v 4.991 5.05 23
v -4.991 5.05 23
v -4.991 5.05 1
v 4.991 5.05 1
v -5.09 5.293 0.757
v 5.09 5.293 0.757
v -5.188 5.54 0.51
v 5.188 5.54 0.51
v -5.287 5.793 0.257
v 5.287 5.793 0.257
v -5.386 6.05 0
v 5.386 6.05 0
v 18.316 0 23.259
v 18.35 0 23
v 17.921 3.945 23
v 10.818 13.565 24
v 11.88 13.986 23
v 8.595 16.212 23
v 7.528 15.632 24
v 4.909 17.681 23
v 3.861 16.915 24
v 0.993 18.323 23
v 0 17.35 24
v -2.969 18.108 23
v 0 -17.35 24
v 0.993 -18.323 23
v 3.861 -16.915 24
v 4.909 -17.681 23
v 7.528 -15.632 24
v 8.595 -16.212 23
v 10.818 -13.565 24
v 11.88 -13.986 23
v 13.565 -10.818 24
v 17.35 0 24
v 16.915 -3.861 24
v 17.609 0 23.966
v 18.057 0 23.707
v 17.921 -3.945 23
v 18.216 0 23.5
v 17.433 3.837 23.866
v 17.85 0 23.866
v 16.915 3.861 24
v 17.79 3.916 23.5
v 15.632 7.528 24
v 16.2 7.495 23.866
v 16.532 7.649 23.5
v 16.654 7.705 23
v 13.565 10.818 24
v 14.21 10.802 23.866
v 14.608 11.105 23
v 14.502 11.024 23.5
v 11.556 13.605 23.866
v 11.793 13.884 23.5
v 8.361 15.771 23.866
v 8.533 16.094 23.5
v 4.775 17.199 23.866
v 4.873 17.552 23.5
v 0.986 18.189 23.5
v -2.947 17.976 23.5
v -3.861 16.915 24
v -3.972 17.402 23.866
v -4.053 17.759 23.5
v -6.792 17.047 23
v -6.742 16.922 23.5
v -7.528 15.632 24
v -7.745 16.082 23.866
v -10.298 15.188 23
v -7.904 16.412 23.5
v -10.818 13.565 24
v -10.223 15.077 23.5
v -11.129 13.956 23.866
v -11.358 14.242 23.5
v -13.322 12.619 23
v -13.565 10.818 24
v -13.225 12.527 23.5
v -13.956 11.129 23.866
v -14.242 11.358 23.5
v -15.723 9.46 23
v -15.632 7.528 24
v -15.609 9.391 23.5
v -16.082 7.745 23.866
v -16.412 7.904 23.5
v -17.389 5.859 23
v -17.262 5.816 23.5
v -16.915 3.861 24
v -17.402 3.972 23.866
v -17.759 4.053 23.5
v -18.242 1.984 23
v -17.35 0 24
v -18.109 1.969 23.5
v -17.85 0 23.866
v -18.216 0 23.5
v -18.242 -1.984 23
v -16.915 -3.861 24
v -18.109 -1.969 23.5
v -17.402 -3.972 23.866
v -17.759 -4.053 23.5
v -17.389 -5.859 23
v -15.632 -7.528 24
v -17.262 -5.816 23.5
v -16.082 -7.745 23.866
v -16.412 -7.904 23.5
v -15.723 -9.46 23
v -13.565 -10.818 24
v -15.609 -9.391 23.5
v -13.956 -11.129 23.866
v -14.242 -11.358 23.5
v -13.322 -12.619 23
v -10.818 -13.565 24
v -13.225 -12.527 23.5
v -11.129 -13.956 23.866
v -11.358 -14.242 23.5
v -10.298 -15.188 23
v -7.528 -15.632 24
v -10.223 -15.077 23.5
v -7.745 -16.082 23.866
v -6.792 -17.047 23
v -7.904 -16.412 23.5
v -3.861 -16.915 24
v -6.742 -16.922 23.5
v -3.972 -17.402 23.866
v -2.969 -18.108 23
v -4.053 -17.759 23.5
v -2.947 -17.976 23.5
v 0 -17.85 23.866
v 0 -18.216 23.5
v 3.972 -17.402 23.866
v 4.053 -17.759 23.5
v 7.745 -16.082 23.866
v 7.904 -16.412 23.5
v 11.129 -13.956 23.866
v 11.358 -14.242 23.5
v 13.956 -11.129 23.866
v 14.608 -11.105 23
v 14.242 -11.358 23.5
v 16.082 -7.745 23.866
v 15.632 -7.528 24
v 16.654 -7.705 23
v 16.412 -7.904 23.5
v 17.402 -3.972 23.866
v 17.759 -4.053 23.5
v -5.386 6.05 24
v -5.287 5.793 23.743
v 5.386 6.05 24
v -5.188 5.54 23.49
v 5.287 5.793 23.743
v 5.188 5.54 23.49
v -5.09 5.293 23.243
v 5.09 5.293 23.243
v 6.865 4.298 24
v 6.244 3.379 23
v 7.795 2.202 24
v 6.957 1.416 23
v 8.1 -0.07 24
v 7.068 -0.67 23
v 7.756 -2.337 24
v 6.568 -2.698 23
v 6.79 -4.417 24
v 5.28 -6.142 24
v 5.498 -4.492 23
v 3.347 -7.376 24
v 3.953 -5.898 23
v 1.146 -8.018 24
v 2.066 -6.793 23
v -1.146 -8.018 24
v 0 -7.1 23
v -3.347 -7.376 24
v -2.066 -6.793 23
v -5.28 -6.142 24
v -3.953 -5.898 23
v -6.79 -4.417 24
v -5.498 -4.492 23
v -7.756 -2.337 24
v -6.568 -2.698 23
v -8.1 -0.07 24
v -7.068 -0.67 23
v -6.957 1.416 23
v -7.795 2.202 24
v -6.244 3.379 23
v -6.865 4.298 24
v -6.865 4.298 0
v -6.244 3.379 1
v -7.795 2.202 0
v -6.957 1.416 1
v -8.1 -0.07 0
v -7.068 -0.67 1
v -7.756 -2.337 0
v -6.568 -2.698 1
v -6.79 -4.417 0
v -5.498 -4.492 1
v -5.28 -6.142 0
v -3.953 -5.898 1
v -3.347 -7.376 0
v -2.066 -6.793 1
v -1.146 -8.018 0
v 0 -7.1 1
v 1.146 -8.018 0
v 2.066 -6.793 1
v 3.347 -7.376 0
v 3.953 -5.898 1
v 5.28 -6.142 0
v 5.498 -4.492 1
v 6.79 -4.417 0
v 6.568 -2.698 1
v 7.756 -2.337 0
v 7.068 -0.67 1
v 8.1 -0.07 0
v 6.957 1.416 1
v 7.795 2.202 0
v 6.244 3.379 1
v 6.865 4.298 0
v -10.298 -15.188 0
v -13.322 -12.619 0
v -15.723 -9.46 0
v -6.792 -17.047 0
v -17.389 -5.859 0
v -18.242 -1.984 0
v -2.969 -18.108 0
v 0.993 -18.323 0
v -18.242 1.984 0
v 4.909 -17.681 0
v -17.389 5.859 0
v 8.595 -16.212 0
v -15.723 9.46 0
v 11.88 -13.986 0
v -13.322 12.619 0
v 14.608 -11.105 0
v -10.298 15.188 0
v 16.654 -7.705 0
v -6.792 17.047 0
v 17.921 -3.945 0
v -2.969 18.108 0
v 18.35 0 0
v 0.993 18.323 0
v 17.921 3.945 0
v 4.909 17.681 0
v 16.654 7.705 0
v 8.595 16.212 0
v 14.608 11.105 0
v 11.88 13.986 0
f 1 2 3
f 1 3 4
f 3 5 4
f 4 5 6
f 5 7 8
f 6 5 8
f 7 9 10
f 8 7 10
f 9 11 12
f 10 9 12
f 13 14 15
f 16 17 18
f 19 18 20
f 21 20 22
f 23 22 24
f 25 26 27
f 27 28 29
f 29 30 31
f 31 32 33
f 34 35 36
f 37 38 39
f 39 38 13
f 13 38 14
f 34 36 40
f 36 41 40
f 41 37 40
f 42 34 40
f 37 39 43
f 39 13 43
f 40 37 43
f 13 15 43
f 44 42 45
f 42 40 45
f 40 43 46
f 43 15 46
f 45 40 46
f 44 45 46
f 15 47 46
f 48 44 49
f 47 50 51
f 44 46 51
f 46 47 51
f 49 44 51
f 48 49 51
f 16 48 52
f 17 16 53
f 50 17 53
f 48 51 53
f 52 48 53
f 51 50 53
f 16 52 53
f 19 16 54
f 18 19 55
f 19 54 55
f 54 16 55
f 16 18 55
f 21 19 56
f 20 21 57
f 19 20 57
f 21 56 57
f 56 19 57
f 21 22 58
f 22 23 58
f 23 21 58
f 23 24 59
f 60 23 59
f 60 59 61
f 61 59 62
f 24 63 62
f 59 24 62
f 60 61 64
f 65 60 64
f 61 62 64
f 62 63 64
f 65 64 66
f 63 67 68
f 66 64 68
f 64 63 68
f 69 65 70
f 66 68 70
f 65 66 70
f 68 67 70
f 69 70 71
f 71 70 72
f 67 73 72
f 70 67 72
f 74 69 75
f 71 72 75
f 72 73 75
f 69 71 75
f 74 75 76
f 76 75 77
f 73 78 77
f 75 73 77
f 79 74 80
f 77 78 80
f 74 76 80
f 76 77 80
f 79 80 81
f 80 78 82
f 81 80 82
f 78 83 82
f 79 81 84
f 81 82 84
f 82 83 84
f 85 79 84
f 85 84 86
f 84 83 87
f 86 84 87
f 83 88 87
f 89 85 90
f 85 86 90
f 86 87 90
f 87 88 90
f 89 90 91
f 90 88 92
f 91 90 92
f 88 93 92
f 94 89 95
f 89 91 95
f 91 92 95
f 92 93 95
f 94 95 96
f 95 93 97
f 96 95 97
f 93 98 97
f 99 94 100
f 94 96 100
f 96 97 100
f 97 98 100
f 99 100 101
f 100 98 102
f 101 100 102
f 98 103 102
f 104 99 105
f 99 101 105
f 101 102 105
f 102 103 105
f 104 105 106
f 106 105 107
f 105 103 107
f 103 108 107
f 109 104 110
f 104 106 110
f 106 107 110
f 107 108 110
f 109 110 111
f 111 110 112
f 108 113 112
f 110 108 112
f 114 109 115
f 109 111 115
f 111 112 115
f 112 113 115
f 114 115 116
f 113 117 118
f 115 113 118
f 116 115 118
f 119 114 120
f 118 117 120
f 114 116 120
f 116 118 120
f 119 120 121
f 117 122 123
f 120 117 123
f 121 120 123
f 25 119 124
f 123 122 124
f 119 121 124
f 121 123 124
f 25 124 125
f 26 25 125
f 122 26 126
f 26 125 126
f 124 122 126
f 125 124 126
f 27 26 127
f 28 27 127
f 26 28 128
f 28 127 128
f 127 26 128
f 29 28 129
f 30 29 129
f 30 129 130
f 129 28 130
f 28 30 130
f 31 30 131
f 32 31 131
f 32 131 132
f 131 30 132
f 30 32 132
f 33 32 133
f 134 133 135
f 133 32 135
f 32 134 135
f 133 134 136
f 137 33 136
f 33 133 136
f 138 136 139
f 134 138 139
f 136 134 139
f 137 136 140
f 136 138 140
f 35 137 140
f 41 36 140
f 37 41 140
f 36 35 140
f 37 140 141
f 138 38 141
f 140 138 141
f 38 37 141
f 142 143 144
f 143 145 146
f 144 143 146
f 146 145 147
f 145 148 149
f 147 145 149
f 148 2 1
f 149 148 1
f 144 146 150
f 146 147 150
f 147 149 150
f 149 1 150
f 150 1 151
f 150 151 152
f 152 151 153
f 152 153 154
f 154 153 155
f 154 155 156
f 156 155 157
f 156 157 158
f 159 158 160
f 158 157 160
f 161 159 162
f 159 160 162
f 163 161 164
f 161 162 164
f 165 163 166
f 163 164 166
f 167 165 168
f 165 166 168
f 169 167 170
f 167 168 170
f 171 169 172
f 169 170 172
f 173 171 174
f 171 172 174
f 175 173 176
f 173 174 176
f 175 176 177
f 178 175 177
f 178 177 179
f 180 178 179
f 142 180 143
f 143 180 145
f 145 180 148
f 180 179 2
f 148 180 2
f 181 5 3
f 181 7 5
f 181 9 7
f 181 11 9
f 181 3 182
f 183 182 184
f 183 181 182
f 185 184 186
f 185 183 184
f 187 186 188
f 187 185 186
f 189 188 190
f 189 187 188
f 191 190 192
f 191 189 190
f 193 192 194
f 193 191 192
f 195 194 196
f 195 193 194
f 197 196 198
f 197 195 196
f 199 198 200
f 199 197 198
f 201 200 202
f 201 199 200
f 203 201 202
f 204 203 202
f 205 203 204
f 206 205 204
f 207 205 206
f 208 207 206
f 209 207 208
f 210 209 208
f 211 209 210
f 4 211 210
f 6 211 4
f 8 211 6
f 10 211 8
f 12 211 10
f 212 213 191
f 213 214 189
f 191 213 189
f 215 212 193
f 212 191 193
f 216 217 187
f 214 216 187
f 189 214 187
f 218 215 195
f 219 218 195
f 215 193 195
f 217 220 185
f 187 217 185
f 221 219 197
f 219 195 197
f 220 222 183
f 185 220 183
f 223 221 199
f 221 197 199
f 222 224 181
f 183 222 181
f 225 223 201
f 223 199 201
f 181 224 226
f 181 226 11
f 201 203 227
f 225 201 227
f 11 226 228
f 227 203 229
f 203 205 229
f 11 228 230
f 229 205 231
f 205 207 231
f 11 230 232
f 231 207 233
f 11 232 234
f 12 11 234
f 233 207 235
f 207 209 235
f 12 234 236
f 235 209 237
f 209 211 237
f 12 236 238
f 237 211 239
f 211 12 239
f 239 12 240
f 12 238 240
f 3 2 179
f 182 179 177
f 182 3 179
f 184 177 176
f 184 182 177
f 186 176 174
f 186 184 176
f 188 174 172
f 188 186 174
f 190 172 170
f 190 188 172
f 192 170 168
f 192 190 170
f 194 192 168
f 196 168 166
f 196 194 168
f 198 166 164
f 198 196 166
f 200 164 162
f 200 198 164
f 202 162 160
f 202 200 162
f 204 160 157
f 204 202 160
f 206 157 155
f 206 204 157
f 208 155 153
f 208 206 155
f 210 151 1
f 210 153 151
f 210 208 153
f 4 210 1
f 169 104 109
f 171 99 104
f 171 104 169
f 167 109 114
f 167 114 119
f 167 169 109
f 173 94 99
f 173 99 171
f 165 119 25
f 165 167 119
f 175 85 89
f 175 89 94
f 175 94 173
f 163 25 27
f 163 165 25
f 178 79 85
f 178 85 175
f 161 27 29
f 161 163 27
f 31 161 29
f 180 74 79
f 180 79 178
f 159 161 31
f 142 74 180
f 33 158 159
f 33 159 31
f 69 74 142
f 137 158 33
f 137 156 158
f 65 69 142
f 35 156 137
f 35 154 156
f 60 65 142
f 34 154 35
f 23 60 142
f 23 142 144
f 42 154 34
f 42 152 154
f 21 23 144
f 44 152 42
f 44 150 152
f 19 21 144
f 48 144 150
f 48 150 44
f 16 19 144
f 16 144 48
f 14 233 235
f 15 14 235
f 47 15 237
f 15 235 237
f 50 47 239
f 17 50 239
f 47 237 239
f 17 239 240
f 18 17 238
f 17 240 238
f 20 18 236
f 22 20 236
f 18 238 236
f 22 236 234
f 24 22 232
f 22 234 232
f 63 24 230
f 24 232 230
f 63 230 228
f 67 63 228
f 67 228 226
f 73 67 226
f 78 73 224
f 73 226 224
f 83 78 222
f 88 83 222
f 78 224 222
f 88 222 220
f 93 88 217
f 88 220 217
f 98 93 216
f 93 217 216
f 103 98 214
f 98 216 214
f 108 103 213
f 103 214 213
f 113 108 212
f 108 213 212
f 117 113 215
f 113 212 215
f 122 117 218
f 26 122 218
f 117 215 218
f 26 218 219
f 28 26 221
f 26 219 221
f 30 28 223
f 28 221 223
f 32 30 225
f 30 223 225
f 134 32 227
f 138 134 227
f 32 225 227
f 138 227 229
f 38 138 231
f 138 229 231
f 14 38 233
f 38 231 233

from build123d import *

# Parameters (mm, degrees)
F0_R     = 18.35
F0_R_2   = 7.1
F1_DEPTH = 24
F3_DEPTH = 24
F4_SIZE  = 1
F5_SIZE2 = 1
F5_SIZE  = 1
F6_R     = 1


with BuildPart() as f1:
    # F0 (on Top) → F1 (new body)
    with BuildSketch(Plane.XY):
        Circle(F0_R)
        Circle(F0_R_2, mode=Mode.SUBTRACT)
    extrude(amount=F1_DEPTH)

    # F2 (on face) → F3 (join)
    with BuildSketch(Plane.XY.offset(24)):
        with BuildLine():
            ThreePointArc((4.9907414279, 5.05), (0, 7.1), (-4.9907414279, 5.05))
            Line((-4.9907414279, 5.05), (4.9907414279, 5.05))
        make_face()
    extrude(amount=-F3_DEPTH)

    # F4
    f4_edges = [f1.edges().sort_by_distance(p)[0] for p in [
        (0, 5.05, 24),
        (0, -7.1, 24),
    ]]
    chamfer(f4_edges, length=F4_SIZE)

    # F5
    f5_edges = [f1.edges().sort_by_distance(p)[0] for p in [
        (0, 5.05, 0),
        (0, -7.1, 0),
    ]]
    chamfer(f5_edges, length=F5_SIZE, length2=F5_SIZE2)

    # F6
    f6_edges = [f1.edges().sort_by_distance(p)[0] for p in [
        (-18.35, 0, 24),
    ]]
    fillet(f6_edges, radius=F6_R)


solid = f1.part
